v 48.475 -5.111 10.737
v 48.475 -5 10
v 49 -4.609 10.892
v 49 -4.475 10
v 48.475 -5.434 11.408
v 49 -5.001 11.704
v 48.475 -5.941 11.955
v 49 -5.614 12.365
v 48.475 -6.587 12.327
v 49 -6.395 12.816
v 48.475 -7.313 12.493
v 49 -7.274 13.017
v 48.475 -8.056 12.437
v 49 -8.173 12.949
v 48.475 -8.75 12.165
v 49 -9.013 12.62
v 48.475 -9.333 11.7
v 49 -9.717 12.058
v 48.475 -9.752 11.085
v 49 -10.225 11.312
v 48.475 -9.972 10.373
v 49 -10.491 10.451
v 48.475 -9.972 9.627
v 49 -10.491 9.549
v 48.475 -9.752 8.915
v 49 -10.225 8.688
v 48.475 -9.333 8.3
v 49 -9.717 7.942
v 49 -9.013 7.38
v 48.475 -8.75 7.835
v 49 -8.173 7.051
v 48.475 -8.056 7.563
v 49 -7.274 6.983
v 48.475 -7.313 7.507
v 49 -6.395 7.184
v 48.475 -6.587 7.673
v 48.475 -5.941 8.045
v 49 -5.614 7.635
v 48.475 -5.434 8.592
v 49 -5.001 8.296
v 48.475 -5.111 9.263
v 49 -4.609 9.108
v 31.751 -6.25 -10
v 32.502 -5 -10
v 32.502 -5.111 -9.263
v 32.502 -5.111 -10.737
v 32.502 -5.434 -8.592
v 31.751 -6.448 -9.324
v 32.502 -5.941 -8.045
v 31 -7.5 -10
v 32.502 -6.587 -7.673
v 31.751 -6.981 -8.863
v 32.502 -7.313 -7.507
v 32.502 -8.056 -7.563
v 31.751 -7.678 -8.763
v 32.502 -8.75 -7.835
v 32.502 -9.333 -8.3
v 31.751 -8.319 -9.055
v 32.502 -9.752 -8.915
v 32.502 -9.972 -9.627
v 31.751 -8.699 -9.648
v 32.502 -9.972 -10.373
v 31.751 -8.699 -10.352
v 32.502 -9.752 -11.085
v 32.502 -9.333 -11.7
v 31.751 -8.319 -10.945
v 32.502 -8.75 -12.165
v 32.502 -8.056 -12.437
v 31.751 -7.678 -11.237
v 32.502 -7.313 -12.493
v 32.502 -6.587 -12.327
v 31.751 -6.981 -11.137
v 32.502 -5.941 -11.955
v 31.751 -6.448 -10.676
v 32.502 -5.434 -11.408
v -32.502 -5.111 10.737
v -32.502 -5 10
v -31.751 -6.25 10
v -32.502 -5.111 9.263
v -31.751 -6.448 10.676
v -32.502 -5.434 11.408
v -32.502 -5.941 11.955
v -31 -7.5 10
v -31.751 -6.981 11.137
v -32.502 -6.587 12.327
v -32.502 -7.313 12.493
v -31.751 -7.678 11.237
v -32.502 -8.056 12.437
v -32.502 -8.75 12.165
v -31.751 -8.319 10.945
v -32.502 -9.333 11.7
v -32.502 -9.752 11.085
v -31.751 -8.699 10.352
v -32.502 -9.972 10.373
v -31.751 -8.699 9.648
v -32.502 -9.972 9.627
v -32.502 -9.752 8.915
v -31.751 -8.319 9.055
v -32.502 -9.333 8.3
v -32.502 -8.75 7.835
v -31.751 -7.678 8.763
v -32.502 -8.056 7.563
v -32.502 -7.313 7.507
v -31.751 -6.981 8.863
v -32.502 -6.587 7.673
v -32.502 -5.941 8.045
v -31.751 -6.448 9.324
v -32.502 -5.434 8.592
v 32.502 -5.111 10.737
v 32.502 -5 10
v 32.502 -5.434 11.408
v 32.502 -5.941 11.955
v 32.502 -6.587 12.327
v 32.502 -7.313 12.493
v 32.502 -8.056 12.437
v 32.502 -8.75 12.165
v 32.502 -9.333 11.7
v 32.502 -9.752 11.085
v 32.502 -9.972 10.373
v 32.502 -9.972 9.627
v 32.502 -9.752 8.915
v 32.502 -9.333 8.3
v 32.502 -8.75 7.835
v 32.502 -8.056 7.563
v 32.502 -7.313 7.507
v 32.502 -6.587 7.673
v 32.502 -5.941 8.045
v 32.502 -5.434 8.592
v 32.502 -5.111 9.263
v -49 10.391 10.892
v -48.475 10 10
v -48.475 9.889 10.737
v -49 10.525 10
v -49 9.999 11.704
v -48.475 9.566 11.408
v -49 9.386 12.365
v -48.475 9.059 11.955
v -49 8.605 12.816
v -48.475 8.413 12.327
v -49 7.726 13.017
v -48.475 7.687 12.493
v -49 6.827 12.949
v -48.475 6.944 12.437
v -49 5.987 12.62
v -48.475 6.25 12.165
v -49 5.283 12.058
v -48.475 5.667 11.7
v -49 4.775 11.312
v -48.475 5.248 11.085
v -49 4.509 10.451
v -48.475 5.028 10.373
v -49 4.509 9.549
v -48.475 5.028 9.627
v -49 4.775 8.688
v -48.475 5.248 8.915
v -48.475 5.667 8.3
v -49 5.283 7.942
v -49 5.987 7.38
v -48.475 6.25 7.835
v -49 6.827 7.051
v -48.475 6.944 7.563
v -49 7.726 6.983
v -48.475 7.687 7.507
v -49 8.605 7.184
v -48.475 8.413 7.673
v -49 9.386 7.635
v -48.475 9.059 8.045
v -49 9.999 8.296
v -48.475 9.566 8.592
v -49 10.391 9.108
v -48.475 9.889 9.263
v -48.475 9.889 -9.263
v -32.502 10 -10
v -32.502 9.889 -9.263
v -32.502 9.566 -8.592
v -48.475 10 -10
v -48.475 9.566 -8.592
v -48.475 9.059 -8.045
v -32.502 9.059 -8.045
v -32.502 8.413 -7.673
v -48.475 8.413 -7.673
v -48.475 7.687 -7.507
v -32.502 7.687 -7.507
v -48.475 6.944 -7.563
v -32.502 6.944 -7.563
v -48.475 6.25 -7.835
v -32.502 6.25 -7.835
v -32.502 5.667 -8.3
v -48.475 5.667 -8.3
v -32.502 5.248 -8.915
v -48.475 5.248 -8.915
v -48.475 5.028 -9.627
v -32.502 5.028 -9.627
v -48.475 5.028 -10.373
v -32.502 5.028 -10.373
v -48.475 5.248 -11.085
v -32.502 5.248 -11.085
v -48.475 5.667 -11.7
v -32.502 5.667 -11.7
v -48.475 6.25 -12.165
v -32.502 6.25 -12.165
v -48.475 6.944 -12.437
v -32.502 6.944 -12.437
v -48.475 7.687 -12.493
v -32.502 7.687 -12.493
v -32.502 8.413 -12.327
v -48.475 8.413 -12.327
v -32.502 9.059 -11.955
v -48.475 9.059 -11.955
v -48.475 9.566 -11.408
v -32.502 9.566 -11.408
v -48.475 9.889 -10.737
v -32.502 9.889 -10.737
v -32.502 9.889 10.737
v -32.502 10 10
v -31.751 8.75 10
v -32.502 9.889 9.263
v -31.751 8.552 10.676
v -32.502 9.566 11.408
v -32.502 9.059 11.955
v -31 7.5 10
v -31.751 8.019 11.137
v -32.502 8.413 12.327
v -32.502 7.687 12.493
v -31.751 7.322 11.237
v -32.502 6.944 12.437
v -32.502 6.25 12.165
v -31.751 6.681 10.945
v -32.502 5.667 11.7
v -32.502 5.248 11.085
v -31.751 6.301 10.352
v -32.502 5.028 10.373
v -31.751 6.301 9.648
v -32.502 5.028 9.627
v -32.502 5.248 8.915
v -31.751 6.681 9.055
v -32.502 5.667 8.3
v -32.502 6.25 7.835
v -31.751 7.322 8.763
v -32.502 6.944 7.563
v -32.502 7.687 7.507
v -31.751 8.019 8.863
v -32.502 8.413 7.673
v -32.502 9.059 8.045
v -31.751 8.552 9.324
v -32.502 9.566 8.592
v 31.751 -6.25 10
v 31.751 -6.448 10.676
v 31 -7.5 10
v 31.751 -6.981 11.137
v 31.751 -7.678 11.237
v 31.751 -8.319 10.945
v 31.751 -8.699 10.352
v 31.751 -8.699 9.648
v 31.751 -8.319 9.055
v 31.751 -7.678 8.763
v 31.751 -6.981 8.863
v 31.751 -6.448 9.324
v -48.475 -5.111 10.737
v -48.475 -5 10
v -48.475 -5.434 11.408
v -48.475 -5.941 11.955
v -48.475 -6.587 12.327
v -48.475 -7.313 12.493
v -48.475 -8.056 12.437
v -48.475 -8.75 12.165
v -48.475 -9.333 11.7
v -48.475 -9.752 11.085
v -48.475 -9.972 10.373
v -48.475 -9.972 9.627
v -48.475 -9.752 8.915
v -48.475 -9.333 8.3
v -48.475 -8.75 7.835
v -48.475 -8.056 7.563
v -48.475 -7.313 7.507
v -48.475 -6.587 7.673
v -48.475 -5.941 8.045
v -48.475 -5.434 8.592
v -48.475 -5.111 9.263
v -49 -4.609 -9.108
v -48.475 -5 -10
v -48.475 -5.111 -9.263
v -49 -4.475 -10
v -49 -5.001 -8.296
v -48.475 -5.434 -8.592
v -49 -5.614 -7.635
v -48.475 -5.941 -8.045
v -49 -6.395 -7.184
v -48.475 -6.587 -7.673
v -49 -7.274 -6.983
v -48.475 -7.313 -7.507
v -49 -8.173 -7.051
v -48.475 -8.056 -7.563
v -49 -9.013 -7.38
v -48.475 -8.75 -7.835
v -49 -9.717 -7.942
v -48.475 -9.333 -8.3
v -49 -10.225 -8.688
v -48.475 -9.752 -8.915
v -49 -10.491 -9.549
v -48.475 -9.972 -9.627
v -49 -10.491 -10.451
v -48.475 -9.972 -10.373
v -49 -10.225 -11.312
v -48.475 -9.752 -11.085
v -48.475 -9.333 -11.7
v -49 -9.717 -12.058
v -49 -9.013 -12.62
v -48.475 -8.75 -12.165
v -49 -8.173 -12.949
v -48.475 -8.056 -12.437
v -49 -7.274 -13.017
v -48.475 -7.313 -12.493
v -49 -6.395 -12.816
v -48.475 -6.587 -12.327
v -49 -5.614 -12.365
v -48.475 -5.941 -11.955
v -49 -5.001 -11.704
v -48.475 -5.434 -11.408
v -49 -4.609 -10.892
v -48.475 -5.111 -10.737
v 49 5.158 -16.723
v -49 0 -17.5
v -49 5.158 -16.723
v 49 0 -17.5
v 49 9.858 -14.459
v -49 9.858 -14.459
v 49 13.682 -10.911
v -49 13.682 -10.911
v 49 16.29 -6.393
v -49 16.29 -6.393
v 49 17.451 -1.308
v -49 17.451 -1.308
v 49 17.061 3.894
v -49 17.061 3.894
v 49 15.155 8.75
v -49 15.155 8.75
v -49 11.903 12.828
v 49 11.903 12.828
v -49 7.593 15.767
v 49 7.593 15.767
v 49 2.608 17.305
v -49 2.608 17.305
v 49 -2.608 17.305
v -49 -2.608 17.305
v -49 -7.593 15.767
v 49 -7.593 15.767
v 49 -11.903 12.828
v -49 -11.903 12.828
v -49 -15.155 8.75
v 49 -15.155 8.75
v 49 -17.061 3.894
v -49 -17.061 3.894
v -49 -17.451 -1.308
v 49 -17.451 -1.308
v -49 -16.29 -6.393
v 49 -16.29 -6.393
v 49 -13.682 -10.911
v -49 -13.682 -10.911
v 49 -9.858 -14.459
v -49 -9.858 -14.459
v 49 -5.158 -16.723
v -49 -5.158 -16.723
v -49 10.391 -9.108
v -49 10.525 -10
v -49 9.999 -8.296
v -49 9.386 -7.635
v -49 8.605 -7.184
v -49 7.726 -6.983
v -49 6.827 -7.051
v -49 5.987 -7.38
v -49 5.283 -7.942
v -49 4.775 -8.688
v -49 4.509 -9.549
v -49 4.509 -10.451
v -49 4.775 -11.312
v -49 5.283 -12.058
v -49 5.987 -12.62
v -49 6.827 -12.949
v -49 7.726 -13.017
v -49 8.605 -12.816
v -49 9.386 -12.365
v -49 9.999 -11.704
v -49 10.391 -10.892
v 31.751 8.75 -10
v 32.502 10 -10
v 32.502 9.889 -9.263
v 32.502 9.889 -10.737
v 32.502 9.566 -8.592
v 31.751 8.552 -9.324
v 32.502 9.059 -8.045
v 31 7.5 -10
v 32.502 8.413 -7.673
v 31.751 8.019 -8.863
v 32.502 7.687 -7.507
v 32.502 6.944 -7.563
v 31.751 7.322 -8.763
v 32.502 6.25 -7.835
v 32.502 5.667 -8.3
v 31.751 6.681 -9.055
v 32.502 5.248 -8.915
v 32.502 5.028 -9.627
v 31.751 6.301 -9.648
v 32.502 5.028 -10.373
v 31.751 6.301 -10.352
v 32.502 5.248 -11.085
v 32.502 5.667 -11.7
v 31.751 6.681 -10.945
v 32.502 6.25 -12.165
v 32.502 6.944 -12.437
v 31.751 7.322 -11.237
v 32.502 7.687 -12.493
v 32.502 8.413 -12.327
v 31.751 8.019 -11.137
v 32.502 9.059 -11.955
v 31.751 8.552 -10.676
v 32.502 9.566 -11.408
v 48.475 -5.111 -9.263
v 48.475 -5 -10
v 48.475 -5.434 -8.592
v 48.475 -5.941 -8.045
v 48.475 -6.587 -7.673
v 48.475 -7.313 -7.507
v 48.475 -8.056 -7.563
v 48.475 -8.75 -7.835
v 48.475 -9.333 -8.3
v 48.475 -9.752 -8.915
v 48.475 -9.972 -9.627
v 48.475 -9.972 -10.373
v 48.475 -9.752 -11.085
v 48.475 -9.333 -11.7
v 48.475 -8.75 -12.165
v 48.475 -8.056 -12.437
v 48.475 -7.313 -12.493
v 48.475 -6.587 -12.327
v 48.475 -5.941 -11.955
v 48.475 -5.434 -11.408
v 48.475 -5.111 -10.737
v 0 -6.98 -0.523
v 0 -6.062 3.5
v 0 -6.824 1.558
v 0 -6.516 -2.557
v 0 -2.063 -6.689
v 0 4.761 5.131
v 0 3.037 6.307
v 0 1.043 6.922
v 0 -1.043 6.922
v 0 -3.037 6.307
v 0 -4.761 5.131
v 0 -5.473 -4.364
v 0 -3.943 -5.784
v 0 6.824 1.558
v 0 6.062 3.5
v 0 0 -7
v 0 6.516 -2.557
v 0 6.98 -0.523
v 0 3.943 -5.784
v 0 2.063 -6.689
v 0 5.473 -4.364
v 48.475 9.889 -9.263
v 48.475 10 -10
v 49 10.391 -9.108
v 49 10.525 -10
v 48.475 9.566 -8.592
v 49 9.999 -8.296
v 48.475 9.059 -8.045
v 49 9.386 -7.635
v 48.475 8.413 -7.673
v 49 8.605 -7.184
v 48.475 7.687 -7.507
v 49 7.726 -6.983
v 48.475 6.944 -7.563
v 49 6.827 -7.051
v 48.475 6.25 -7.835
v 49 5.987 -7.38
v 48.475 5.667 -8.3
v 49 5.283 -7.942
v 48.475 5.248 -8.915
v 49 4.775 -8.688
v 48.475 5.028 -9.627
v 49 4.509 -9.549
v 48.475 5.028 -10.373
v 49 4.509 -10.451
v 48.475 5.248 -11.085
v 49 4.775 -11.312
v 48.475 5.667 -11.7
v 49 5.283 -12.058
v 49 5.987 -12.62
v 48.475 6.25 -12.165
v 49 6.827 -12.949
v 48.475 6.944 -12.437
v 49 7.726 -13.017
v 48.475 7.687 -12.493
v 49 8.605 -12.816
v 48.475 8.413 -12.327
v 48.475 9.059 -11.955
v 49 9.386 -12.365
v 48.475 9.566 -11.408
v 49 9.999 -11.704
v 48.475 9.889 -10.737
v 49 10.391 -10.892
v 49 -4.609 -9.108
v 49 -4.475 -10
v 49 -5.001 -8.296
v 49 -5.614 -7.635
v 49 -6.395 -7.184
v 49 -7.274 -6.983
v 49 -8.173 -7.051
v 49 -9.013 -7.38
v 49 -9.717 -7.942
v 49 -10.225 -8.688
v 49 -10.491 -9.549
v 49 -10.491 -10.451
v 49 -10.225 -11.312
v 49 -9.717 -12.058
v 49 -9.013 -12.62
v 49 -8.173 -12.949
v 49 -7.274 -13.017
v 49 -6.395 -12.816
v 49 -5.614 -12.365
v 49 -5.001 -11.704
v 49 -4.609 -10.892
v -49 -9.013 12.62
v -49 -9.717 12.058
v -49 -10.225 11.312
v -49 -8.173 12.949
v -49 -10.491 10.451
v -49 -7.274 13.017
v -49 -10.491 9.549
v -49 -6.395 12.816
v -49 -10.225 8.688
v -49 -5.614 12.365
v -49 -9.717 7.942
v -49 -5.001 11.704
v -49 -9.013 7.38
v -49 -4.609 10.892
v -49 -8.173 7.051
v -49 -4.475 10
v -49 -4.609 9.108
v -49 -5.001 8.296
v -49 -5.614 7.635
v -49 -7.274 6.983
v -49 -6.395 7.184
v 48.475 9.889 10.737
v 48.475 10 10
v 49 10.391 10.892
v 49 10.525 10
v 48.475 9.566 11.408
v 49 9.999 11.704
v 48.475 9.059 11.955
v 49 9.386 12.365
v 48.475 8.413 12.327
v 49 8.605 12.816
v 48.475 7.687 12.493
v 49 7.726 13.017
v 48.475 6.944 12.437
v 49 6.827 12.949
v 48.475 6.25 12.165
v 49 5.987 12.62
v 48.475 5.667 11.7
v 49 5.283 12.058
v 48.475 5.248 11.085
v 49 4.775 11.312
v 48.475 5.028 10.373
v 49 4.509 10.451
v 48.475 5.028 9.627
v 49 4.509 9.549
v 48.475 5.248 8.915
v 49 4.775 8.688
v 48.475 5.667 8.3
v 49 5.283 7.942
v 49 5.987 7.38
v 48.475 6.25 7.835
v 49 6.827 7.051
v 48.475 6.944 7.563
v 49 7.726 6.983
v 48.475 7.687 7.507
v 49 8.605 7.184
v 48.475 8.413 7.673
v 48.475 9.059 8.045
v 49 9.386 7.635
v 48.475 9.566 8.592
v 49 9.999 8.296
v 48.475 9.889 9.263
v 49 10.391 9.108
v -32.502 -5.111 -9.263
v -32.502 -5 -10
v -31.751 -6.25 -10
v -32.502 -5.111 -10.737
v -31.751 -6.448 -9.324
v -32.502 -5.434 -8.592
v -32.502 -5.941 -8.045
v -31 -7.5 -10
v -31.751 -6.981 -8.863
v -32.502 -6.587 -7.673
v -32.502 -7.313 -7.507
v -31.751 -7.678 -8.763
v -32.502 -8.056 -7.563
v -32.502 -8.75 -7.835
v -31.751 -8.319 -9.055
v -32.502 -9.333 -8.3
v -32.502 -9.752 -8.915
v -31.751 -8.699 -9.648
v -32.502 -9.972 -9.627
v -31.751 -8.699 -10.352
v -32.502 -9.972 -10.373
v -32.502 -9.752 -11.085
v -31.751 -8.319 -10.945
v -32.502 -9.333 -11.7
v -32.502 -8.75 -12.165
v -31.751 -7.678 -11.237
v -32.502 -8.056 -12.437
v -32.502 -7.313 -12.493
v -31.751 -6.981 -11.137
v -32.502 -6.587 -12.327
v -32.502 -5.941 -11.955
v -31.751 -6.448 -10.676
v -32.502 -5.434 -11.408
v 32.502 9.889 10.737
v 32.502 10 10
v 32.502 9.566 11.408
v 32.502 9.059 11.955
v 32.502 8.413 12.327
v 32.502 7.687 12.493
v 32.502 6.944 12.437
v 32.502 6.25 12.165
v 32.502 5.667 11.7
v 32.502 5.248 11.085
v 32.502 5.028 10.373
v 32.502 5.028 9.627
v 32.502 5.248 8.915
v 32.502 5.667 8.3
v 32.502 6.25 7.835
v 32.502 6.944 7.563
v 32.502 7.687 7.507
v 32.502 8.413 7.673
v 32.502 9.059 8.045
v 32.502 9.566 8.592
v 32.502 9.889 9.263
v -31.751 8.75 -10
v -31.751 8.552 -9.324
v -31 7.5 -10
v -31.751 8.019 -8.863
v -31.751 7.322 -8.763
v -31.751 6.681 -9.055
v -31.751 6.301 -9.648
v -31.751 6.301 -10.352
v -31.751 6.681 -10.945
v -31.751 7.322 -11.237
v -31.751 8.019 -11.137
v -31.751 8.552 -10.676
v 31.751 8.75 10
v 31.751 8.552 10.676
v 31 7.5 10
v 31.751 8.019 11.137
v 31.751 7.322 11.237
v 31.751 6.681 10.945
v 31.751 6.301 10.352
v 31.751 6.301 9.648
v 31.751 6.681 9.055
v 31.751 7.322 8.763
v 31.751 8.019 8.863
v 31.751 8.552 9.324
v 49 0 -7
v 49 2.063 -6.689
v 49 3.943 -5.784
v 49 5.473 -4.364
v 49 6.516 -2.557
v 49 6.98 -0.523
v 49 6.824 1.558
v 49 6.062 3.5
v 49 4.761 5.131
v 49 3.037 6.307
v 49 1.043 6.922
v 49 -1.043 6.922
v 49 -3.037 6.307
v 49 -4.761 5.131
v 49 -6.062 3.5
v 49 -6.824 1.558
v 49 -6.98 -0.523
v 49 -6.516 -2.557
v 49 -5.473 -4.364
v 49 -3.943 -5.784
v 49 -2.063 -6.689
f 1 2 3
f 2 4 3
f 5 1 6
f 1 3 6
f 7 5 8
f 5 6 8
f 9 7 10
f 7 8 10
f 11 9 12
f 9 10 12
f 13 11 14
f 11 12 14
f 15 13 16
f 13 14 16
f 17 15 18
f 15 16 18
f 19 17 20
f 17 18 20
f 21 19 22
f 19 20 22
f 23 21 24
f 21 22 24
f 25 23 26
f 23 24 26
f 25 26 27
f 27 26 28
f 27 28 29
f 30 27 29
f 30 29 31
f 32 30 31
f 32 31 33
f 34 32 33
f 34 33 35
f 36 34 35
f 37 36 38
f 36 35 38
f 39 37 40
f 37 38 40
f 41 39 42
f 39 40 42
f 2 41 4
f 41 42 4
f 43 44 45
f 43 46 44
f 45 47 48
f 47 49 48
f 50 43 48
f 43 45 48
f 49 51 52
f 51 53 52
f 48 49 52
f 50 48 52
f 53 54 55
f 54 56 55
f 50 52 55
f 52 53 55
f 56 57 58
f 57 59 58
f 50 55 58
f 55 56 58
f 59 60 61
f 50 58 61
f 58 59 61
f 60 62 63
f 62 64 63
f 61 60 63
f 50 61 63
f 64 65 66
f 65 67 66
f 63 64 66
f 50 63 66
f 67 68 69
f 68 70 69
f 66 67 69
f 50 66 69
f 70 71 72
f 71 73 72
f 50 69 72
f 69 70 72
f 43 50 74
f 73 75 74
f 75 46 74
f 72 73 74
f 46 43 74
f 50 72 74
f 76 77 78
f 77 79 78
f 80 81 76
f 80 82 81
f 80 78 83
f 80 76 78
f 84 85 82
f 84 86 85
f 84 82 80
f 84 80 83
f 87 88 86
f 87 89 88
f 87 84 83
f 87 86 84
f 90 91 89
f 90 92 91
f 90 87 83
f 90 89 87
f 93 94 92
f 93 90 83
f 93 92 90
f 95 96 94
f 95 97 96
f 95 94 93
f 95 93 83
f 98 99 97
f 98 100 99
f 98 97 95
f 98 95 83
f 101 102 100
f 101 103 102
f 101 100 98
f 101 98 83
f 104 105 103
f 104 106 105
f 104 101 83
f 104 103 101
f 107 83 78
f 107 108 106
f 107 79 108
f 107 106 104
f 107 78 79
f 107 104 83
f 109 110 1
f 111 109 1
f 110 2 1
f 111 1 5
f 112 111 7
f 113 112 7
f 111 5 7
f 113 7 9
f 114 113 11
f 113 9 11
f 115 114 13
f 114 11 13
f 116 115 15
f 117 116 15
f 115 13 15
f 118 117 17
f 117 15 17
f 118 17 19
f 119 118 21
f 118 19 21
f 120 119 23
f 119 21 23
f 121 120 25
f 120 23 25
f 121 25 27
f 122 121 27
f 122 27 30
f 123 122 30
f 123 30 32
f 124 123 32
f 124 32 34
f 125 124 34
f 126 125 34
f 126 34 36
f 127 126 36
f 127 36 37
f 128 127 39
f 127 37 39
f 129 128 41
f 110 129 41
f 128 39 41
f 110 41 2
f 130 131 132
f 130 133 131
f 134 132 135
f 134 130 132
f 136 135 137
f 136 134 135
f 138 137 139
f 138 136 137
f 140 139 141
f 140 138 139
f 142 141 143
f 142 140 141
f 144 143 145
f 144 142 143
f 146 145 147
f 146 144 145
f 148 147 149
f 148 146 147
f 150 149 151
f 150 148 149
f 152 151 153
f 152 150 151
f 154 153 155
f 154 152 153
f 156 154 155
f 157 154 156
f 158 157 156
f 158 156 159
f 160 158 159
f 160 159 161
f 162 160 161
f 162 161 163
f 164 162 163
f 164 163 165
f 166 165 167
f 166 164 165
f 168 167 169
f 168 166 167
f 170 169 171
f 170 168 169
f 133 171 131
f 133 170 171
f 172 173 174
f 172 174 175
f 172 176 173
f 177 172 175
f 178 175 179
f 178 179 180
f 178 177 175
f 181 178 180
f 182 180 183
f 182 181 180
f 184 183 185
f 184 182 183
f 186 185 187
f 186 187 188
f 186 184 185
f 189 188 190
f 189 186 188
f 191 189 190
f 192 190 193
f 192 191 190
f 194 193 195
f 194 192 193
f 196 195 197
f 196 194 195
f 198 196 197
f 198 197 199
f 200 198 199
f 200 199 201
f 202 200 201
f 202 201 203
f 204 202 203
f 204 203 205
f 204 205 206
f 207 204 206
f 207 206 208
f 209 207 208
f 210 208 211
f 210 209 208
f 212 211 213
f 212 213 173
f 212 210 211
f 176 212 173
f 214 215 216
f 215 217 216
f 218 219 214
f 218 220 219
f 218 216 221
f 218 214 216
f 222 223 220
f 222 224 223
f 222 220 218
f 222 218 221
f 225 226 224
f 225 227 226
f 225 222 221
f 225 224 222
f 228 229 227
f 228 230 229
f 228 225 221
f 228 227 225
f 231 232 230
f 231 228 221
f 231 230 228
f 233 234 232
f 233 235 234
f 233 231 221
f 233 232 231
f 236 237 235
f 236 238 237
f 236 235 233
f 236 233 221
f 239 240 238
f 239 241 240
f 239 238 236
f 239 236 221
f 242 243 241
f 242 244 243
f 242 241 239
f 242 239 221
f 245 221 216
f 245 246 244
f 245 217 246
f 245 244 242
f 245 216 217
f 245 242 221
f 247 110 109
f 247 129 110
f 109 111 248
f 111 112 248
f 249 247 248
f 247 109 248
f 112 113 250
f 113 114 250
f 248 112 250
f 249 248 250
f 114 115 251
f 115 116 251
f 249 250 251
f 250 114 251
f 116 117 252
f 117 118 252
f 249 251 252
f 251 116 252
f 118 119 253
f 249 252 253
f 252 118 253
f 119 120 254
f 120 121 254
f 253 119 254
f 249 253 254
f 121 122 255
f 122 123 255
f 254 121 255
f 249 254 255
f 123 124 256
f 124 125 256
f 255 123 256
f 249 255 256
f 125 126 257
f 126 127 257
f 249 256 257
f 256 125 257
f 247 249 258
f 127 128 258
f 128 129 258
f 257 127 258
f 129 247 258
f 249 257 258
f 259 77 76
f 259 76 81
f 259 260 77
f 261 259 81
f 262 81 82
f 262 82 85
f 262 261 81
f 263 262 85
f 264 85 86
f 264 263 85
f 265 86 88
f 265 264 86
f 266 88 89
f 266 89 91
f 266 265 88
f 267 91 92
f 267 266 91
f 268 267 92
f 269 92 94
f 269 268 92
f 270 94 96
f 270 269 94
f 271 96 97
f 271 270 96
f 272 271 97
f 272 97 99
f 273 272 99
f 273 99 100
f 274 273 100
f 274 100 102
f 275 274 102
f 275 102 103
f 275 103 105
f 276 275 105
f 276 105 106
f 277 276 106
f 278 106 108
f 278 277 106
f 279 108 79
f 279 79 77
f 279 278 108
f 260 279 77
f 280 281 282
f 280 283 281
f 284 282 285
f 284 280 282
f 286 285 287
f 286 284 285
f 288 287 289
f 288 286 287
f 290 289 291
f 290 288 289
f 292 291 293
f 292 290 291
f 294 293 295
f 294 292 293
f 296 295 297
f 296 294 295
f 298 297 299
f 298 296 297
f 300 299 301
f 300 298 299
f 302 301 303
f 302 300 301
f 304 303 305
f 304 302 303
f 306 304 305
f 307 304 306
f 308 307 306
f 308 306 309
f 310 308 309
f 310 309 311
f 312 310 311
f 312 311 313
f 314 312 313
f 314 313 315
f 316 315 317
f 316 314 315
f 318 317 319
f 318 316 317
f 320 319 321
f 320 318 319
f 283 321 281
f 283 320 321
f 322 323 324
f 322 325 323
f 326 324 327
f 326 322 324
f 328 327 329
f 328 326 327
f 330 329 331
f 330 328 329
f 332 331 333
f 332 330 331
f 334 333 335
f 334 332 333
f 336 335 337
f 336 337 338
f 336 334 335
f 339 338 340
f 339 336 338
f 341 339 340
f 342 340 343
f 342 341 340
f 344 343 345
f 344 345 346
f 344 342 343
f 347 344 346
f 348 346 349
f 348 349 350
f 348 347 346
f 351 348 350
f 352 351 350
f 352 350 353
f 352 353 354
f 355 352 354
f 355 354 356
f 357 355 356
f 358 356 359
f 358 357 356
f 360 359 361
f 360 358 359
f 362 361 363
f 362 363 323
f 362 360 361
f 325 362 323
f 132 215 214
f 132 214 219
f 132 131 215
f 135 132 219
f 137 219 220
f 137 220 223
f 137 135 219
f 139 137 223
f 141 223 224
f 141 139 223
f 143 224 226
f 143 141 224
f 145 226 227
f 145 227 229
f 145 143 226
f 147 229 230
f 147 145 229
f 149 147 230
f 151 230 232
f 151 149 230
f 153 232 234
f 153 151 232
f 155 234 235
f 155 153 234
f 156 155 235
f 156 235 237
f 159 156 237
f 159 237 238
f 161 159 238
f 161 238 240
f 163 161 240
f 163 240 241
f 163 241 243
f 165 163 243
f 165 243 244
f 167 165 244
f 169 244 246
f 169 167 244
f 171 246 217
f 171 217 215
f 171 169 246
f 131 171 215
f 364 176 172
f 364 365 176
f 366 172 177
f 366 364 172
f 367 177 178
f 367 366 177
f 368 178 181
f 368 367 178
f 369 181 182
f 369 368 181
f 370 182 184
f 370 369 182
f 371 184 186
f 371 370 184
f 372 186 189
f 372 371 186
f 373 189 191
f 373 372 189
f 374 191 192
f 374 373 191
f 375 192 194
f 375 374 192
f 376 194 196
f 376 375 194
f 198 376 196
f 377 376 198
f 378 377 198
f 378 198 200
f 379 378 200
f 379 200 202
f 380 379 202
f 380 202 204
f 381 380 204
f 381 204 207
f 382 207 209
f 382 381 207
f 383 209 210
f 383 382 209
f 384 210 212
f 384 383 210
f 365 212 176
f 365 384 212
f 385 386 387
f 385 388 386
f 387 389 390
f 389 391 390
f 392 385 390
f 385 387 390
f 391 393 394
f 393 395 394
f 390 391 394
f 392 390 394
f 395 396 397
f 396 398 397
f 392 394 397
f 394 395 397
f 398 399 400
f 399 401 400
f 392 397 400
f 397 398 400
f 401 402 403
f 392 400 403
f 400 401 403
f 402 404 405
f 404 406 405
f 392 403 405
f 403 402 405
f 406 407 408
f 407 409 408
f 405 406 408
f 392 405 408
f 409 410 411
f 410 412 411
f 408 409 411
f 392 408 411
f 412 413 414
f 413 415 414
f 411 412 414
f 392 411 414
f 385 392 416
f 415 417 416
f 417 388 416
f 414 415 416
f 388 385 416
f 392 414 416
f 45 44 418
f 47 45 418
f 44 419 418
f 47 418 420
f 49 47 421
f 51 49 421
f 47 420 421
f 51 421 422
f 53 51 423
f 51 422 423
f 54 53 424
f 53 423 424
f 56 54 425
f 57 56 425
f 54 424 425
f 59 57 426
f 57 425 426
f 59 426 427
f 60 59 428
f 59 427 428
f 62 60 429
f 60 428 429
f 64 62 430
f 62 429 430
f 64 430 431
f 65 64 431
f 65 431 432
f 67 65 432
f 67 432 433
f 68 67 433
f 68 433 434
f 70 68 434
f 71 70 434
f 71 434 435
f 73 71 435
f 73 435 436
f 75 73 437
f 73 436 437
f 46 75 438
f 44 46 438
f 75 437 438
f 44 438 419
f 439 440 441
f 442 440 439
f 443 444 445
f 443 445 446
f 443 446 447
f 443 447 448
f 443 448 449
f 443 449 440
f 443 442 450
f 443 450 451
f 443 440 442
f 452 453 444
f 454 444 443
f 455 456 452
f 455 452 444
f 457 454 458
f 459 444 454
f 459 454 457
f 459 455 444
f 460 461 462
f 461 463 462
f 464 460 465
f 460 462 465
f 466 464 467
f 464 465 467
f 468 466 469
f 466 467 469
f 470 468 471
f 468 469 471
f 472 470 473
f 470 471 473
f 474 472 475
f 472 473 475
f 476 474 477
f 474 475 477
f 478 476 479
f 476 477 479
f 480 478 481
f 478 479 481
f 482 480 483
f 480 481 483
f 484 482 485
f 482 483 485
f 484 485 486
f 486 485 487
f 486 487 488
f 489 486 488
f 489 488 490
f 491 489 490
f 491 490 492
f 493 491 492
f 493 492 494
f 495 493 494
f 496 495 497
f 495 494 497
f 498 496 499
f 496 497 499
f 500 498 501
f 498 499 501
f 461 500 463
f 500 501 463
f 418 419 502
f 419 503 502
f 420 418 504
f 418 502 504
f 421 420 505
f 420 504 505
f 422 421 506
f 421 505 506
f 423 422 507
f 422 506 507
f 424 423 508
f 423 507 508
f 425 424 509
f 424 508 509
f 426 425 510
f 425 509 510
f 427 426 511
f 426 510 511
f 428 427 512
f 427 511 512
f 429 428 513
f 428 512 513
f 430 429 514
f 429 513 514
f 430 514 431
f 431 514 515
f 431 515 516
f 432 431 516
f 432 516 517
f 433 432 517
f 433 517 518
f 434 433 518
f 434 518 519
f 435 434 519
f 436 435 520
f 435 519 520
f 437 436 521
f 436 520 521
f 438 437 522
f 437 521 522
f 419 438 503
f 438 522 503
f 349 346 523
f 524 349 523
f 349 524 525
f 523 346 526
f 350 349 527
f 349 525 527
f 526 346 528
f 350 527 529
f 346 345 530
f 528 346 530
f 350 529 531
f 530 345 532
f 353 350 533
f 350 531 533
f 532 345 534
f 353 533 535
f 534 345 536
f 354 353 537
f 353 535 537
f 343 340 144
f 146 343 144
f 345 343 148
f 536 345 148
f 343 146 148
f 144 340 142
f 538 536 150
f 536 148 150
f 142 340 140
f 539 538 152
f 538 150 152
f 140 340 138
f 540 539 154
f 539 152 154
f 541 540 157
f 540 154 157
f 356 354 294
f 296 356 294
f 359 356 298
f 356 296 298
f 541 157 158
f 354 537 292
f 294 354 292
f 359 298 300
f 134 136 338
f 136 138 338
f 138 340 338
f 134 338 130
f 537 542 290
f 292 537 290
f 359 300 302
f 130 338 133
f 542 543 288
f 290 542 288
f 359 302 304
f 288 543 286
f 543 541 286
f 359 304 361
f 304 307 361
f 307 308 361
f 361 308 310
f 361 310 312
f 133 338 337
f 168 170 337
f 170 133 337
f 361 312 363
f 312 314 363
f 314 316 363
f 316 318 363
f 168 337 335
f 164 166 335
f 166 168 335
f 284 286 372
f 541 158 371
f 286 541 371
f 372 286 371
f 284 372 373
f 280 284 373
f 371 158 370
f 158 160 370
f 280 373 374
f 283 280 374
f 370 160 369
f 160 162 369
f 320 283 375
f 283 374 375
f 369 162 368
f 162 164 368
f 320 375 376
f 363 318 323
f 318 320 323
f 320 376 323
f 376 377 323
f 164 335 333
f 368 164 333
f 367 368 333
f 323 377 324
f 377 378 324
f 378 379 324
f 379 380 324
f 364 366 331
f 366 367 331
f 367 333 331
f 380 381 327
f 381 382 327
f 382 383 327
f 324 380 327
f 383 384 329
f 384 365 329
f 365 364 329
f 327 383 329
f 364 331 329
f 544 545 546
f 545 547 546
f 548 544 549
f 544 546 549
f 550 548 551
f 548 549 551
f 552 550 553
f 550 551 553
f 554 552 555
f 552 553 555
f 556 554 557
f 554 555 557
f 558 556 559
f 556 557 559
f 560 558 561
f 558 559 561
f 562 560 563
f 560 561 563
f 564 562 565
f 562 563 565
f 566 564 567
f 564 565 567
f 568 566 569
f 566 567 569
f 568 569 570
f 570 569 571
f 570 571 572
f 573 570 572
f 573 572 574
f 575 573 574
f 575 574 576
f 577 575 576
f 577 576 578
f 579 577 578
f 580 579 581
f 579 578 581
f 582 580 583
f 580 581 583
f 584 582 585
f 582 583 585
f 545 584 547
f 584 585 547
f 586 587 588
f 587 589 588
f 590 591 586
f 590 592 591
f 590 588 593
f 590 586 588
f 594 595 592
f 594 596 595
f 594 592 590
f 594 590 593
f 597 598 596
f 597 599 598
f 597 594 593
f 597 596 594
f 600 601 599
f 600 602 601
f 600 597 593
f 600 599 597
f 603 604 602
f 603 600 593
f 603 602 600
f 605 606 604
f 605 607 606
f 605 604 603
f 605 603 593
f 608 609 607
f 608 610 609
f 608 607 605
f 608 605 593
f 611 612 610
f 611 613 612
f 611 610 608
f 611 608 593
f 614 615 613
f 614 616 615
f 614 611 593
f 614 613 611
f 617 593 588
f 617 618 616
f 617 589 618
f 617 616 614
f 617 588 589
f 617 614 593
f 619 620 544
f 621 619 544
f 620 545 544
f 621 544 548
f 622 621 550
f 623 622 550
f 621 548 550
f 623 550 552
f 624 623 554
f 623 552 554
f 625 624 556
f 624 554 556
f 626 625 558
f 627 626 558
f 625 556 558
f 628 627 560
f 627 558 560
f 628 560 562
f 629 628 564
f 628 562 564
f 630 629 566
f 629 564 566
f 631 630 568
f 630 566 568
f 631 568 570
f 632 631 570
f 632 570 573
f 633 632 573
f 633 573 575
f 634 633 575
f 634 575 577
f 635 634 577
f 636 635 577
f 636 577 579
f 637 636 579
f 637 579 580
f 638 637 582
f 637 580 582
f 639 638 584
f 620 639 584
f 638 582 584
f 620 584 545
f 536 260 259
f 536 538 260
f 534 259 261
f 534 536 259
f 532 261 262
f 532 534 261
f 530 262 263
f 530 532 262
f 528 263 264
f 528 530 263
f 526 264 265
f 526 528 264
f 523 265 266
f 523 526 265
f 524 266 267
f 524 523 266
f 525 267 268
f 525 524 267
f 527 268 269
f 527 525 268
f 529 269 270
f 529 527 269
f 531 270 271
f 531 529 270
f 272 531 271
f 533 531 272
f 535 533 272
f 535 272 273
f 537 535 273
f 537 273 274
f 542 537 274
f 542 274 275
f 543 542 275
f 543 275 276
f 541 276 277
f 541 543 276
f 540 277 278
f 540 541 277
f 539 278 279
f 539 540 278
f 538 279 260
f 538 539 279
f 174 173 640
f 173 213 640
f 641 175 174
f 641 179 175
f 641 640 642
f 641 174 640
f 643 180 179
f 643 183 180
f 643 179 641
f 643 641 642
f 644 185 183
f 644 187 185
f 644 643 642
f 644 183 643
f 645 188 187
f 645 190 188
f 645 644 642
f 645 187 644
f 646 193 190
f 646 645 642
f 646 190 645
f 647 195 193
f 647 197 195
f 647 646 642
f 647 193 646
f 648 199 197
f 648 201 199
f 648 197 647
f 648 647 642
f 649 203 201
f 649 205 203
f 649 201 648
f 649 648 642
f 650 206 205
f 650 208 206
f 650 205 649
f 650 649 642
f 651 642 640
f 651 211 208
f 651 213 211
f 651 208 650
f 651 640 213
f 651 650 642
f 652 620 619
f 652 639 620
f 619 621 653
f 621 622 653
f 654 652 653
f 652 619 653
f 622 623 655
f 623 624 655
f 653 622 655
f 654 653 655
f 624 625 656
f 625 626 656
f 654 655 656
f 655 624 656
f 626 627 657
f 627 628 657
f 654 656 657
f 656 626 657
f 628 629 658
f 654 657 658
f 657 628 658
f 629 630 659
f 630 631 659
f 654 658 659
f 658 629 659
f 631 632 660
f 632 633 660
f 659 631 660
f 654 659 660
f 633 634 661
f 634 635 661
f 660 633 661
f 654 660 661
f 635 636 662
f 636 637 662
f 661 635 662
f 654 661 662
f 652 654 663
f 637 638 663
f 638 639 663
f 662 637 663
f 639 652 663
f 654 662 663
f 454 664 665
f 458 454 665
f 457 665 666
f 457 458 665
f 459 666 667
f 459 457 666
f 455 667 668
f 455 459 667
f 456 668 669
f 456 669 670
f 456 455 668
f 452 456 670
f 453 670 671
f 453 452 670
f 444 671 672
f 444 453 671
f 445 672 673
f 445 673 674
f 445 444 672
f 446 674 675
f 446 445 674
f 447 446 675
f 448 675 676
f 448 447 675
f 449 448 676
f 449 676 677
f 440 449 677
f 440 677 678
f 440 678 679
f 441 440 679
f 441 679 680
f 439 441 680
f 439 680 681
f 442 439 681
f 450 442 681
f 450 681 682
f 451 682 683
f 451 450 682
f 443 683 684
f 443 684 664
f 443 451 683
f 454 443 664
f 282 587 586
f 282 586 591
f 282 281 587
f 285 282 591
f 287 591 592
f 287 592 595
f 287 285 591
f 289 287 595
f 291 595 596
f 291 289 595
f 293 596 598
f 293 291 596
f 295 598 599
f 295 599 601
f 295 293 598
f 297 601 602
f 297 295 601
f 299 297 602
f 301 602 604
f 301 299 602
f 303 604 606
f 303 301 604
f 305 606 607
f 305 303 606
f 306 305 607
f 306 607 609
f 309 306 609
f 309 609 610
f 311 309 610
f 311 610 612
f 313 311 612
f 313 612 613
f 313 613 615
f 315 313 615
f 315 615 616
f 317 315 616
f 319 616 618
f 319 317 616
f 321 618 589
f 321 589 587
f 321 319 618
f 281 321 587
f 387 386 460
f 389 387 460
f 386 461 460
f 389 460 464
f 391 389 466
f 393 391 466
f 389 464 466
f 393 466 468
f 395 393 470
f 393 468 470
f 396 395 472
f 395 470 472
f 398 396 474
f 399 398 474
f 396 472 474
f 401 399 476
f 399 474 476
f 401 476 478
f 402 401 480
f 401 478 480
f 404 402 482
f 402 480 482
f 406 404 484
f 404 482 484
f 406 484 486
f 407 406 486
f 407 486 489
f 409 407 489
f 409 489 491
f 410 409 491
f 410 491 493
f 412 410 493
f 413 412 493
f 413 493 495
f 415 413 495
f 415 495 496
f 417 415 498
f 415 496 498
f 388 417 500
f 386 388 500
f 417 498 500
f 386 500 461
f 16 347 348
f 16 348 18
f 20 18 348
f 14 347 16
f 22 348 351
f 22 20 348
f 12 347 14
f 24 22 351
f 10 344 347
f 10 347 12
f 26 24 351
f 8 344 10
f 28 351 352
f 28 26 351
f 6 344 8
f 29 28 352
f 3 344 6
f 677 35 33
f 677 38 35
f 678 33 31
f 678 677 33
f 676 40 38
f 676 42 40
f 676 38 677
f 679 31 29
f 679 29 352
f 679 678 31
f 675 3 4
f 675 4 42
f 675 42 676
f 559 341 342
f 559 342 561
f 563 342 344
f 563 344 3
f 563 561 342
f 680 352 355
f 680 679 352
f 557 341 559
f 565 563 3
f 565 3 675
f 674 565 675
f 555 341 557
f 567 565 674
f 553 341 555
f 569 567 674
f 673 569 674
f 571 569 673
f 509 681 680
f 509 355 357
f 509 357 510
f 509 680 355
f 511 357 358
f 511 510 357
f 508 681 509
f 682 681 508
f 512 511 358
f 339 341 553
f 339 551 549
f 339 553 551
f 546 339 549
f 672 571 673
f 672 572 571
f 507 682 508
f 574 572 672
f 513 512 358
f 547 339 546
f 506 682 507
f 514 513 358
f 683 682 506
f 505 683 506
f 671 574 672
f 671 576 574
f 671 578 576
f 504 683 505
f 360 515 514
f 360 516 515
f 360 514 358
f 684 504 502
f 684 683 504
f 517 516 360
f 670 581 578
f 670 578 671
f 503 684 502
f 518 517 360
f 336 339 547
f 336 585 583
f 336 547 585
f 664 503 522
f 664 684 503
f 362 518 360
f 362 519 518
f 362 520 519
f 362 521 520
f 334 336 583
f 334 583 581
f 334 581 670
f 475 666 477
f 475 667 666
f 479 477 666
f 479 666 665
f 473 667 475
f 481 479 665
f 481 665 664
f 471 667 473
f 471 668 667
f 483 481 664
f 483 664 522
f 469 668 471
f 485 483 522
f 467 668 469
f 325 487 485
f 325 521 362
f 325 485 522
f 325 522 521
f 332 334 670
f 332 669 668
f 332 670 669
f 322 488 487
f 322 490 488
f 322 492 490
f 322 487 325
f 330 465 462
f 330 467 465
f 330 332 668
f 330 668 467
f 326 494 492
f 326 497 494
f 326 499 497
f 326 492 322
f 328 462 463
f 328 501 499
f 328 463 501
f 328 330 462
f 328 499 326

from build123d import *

# Parameters (mm, degrees)
SKETCH2_R           = 17.5
BOSS_EXTRUDE1_DEPTH = 49
CUT_EXTRUDE1_START  = -49
SKETCH3_R           = 7
CUT_EXTRUDE1_DEPTH  = 49


# Read off the part's stored shape, not the designer's step: M6 Tapped Hole1
with BuildPart() as part:
    # Sketch2 → Boss-Extrude1 (new, symmetric)
    with BuildSketch(Plane(origin=(0, 0, 0), x_dir=(0, 0, -1), z_dir=(1, 0, 0))):
        Circle(SKETCH2_R)
    extrude(amount=BOSS_EXTRUDE1_DEPTH, both=True)

    # Sketch3 → Cut-Extrude1 (cut)
    with BuildSketch(Plane(origin=(49, 0, 0), x_dir=(0, 0, -1), z_dir=(1, 0, 0)).offset(CUT_EXTRUDE1_START)):
        Circle(SKETCH3_R)
    extrude(amount=CUT_EXTRUDE1_DEPTH, mode=Mode.SUBTRACT)

    # M6 Tapped Hole1 outline → M6 Tapped Hole1 (revolve, cut)
    with BuildSketch(Plane(origin=(0, -7.5, -10), x_dir=(0, 1, 0), z_dir=(0, 0, -1))):
        Polygon((0, 49), (0, 31), (2.5, 32.502151548), (2.5, 48.475), (3.025, 49), align=None)
    m6_tapped_hole1 = revolve(axis=Axis((0, -7.5, -10), (1, 0, 0)), mode=Mode.SUBTRACT)

    # M6 Tapped Hole1 2 outline → M6 Tapped Hole1 2 (revolve, cut)
    with BuildSketch(Plane(origin=(0, 7.5, 10), x_dir=(0, 1, 0), z_dir=(0, 0, -1))):
        Polygon((0, 49), (0, 31), (2.5, 32.502151548), (2.5, 48.475), (3.025, 49), align=None)
    m6_tapped_hole1_2 = revolve(axis=Axis((0, 7.5, 10), (1, 0, 0)), mode=Mode.SUBTRACT)

    # M6 Tapped Hole1 3 outline → M6 Tapped Hole1 3 (revolve, cut)
    with BuildSketch(Plane(origin=(0, -7.5, 10), x_dir=(0, 1, 0), z_dir=(0, 0, -1))):
        Polygon((0, 49), (0, 31), (2.5, 32.502151548), (2.5, 48.475), (3.025, 49), align=None)
    m6_tapped_hole1_3 = revolve(axis=Axis((0, -7.5, 10), (1, 0, 0)), mode=Mode.SUBTRACT)

    # M6 Tapped Hole1 4 outline → M6 Tapped Hole1 4 (revolve, cut)
    with BuildSketch(Plane(origin=(0, 7.5, -10), x_dir=(0, 1, 0), z_dir=(0, 0, -1))):
        Polygon((0, 49), (0, 31), (2.5, 32.502151548), (2.5, 48.475), (3.025, 49), align=None)
    m6_tapped_hole1_4 = revolve(axis=Axis((0, 7.5, -10), (1, 0, 0)), mode=Mode.SUBTRACT)

    # Mirror1: M6 Tapped Hole1, M6 Tapped Hole1 2, M6 Tapped Hole1 3, M6 Tapped Hole1 4 across plane
    add(m6_tapped_hole1.mirror(Plane(origin=(0, 0, 0), x_dir=(0, 0, 1), z_dir=(1, 0, 0))), mode=Mode.SUBTRACT)
    add(m6_tapped_hole1_2.mirror(Plane(origin=(0, 0, 0), x_dir=(0, 0, 1), z_dir=(1, 0, 0))), mode=Mode.SUBTRACT)
    add(m6_tapped_hole1_3.mirror(Plane(origin=(0, 0, 0), x_dir=(0, 0, 1), z_dir=(1, 0, 0))), mode=Mode.SUBTRACT)
    add(m6_tapped_hole1_4.mirror(Plane(origin=(0, 0, 0), x_dir=(0, 0, 1), z_dir=(1, 0, 0))), mode=Mode.SUBTRACT)


solid = part.part
